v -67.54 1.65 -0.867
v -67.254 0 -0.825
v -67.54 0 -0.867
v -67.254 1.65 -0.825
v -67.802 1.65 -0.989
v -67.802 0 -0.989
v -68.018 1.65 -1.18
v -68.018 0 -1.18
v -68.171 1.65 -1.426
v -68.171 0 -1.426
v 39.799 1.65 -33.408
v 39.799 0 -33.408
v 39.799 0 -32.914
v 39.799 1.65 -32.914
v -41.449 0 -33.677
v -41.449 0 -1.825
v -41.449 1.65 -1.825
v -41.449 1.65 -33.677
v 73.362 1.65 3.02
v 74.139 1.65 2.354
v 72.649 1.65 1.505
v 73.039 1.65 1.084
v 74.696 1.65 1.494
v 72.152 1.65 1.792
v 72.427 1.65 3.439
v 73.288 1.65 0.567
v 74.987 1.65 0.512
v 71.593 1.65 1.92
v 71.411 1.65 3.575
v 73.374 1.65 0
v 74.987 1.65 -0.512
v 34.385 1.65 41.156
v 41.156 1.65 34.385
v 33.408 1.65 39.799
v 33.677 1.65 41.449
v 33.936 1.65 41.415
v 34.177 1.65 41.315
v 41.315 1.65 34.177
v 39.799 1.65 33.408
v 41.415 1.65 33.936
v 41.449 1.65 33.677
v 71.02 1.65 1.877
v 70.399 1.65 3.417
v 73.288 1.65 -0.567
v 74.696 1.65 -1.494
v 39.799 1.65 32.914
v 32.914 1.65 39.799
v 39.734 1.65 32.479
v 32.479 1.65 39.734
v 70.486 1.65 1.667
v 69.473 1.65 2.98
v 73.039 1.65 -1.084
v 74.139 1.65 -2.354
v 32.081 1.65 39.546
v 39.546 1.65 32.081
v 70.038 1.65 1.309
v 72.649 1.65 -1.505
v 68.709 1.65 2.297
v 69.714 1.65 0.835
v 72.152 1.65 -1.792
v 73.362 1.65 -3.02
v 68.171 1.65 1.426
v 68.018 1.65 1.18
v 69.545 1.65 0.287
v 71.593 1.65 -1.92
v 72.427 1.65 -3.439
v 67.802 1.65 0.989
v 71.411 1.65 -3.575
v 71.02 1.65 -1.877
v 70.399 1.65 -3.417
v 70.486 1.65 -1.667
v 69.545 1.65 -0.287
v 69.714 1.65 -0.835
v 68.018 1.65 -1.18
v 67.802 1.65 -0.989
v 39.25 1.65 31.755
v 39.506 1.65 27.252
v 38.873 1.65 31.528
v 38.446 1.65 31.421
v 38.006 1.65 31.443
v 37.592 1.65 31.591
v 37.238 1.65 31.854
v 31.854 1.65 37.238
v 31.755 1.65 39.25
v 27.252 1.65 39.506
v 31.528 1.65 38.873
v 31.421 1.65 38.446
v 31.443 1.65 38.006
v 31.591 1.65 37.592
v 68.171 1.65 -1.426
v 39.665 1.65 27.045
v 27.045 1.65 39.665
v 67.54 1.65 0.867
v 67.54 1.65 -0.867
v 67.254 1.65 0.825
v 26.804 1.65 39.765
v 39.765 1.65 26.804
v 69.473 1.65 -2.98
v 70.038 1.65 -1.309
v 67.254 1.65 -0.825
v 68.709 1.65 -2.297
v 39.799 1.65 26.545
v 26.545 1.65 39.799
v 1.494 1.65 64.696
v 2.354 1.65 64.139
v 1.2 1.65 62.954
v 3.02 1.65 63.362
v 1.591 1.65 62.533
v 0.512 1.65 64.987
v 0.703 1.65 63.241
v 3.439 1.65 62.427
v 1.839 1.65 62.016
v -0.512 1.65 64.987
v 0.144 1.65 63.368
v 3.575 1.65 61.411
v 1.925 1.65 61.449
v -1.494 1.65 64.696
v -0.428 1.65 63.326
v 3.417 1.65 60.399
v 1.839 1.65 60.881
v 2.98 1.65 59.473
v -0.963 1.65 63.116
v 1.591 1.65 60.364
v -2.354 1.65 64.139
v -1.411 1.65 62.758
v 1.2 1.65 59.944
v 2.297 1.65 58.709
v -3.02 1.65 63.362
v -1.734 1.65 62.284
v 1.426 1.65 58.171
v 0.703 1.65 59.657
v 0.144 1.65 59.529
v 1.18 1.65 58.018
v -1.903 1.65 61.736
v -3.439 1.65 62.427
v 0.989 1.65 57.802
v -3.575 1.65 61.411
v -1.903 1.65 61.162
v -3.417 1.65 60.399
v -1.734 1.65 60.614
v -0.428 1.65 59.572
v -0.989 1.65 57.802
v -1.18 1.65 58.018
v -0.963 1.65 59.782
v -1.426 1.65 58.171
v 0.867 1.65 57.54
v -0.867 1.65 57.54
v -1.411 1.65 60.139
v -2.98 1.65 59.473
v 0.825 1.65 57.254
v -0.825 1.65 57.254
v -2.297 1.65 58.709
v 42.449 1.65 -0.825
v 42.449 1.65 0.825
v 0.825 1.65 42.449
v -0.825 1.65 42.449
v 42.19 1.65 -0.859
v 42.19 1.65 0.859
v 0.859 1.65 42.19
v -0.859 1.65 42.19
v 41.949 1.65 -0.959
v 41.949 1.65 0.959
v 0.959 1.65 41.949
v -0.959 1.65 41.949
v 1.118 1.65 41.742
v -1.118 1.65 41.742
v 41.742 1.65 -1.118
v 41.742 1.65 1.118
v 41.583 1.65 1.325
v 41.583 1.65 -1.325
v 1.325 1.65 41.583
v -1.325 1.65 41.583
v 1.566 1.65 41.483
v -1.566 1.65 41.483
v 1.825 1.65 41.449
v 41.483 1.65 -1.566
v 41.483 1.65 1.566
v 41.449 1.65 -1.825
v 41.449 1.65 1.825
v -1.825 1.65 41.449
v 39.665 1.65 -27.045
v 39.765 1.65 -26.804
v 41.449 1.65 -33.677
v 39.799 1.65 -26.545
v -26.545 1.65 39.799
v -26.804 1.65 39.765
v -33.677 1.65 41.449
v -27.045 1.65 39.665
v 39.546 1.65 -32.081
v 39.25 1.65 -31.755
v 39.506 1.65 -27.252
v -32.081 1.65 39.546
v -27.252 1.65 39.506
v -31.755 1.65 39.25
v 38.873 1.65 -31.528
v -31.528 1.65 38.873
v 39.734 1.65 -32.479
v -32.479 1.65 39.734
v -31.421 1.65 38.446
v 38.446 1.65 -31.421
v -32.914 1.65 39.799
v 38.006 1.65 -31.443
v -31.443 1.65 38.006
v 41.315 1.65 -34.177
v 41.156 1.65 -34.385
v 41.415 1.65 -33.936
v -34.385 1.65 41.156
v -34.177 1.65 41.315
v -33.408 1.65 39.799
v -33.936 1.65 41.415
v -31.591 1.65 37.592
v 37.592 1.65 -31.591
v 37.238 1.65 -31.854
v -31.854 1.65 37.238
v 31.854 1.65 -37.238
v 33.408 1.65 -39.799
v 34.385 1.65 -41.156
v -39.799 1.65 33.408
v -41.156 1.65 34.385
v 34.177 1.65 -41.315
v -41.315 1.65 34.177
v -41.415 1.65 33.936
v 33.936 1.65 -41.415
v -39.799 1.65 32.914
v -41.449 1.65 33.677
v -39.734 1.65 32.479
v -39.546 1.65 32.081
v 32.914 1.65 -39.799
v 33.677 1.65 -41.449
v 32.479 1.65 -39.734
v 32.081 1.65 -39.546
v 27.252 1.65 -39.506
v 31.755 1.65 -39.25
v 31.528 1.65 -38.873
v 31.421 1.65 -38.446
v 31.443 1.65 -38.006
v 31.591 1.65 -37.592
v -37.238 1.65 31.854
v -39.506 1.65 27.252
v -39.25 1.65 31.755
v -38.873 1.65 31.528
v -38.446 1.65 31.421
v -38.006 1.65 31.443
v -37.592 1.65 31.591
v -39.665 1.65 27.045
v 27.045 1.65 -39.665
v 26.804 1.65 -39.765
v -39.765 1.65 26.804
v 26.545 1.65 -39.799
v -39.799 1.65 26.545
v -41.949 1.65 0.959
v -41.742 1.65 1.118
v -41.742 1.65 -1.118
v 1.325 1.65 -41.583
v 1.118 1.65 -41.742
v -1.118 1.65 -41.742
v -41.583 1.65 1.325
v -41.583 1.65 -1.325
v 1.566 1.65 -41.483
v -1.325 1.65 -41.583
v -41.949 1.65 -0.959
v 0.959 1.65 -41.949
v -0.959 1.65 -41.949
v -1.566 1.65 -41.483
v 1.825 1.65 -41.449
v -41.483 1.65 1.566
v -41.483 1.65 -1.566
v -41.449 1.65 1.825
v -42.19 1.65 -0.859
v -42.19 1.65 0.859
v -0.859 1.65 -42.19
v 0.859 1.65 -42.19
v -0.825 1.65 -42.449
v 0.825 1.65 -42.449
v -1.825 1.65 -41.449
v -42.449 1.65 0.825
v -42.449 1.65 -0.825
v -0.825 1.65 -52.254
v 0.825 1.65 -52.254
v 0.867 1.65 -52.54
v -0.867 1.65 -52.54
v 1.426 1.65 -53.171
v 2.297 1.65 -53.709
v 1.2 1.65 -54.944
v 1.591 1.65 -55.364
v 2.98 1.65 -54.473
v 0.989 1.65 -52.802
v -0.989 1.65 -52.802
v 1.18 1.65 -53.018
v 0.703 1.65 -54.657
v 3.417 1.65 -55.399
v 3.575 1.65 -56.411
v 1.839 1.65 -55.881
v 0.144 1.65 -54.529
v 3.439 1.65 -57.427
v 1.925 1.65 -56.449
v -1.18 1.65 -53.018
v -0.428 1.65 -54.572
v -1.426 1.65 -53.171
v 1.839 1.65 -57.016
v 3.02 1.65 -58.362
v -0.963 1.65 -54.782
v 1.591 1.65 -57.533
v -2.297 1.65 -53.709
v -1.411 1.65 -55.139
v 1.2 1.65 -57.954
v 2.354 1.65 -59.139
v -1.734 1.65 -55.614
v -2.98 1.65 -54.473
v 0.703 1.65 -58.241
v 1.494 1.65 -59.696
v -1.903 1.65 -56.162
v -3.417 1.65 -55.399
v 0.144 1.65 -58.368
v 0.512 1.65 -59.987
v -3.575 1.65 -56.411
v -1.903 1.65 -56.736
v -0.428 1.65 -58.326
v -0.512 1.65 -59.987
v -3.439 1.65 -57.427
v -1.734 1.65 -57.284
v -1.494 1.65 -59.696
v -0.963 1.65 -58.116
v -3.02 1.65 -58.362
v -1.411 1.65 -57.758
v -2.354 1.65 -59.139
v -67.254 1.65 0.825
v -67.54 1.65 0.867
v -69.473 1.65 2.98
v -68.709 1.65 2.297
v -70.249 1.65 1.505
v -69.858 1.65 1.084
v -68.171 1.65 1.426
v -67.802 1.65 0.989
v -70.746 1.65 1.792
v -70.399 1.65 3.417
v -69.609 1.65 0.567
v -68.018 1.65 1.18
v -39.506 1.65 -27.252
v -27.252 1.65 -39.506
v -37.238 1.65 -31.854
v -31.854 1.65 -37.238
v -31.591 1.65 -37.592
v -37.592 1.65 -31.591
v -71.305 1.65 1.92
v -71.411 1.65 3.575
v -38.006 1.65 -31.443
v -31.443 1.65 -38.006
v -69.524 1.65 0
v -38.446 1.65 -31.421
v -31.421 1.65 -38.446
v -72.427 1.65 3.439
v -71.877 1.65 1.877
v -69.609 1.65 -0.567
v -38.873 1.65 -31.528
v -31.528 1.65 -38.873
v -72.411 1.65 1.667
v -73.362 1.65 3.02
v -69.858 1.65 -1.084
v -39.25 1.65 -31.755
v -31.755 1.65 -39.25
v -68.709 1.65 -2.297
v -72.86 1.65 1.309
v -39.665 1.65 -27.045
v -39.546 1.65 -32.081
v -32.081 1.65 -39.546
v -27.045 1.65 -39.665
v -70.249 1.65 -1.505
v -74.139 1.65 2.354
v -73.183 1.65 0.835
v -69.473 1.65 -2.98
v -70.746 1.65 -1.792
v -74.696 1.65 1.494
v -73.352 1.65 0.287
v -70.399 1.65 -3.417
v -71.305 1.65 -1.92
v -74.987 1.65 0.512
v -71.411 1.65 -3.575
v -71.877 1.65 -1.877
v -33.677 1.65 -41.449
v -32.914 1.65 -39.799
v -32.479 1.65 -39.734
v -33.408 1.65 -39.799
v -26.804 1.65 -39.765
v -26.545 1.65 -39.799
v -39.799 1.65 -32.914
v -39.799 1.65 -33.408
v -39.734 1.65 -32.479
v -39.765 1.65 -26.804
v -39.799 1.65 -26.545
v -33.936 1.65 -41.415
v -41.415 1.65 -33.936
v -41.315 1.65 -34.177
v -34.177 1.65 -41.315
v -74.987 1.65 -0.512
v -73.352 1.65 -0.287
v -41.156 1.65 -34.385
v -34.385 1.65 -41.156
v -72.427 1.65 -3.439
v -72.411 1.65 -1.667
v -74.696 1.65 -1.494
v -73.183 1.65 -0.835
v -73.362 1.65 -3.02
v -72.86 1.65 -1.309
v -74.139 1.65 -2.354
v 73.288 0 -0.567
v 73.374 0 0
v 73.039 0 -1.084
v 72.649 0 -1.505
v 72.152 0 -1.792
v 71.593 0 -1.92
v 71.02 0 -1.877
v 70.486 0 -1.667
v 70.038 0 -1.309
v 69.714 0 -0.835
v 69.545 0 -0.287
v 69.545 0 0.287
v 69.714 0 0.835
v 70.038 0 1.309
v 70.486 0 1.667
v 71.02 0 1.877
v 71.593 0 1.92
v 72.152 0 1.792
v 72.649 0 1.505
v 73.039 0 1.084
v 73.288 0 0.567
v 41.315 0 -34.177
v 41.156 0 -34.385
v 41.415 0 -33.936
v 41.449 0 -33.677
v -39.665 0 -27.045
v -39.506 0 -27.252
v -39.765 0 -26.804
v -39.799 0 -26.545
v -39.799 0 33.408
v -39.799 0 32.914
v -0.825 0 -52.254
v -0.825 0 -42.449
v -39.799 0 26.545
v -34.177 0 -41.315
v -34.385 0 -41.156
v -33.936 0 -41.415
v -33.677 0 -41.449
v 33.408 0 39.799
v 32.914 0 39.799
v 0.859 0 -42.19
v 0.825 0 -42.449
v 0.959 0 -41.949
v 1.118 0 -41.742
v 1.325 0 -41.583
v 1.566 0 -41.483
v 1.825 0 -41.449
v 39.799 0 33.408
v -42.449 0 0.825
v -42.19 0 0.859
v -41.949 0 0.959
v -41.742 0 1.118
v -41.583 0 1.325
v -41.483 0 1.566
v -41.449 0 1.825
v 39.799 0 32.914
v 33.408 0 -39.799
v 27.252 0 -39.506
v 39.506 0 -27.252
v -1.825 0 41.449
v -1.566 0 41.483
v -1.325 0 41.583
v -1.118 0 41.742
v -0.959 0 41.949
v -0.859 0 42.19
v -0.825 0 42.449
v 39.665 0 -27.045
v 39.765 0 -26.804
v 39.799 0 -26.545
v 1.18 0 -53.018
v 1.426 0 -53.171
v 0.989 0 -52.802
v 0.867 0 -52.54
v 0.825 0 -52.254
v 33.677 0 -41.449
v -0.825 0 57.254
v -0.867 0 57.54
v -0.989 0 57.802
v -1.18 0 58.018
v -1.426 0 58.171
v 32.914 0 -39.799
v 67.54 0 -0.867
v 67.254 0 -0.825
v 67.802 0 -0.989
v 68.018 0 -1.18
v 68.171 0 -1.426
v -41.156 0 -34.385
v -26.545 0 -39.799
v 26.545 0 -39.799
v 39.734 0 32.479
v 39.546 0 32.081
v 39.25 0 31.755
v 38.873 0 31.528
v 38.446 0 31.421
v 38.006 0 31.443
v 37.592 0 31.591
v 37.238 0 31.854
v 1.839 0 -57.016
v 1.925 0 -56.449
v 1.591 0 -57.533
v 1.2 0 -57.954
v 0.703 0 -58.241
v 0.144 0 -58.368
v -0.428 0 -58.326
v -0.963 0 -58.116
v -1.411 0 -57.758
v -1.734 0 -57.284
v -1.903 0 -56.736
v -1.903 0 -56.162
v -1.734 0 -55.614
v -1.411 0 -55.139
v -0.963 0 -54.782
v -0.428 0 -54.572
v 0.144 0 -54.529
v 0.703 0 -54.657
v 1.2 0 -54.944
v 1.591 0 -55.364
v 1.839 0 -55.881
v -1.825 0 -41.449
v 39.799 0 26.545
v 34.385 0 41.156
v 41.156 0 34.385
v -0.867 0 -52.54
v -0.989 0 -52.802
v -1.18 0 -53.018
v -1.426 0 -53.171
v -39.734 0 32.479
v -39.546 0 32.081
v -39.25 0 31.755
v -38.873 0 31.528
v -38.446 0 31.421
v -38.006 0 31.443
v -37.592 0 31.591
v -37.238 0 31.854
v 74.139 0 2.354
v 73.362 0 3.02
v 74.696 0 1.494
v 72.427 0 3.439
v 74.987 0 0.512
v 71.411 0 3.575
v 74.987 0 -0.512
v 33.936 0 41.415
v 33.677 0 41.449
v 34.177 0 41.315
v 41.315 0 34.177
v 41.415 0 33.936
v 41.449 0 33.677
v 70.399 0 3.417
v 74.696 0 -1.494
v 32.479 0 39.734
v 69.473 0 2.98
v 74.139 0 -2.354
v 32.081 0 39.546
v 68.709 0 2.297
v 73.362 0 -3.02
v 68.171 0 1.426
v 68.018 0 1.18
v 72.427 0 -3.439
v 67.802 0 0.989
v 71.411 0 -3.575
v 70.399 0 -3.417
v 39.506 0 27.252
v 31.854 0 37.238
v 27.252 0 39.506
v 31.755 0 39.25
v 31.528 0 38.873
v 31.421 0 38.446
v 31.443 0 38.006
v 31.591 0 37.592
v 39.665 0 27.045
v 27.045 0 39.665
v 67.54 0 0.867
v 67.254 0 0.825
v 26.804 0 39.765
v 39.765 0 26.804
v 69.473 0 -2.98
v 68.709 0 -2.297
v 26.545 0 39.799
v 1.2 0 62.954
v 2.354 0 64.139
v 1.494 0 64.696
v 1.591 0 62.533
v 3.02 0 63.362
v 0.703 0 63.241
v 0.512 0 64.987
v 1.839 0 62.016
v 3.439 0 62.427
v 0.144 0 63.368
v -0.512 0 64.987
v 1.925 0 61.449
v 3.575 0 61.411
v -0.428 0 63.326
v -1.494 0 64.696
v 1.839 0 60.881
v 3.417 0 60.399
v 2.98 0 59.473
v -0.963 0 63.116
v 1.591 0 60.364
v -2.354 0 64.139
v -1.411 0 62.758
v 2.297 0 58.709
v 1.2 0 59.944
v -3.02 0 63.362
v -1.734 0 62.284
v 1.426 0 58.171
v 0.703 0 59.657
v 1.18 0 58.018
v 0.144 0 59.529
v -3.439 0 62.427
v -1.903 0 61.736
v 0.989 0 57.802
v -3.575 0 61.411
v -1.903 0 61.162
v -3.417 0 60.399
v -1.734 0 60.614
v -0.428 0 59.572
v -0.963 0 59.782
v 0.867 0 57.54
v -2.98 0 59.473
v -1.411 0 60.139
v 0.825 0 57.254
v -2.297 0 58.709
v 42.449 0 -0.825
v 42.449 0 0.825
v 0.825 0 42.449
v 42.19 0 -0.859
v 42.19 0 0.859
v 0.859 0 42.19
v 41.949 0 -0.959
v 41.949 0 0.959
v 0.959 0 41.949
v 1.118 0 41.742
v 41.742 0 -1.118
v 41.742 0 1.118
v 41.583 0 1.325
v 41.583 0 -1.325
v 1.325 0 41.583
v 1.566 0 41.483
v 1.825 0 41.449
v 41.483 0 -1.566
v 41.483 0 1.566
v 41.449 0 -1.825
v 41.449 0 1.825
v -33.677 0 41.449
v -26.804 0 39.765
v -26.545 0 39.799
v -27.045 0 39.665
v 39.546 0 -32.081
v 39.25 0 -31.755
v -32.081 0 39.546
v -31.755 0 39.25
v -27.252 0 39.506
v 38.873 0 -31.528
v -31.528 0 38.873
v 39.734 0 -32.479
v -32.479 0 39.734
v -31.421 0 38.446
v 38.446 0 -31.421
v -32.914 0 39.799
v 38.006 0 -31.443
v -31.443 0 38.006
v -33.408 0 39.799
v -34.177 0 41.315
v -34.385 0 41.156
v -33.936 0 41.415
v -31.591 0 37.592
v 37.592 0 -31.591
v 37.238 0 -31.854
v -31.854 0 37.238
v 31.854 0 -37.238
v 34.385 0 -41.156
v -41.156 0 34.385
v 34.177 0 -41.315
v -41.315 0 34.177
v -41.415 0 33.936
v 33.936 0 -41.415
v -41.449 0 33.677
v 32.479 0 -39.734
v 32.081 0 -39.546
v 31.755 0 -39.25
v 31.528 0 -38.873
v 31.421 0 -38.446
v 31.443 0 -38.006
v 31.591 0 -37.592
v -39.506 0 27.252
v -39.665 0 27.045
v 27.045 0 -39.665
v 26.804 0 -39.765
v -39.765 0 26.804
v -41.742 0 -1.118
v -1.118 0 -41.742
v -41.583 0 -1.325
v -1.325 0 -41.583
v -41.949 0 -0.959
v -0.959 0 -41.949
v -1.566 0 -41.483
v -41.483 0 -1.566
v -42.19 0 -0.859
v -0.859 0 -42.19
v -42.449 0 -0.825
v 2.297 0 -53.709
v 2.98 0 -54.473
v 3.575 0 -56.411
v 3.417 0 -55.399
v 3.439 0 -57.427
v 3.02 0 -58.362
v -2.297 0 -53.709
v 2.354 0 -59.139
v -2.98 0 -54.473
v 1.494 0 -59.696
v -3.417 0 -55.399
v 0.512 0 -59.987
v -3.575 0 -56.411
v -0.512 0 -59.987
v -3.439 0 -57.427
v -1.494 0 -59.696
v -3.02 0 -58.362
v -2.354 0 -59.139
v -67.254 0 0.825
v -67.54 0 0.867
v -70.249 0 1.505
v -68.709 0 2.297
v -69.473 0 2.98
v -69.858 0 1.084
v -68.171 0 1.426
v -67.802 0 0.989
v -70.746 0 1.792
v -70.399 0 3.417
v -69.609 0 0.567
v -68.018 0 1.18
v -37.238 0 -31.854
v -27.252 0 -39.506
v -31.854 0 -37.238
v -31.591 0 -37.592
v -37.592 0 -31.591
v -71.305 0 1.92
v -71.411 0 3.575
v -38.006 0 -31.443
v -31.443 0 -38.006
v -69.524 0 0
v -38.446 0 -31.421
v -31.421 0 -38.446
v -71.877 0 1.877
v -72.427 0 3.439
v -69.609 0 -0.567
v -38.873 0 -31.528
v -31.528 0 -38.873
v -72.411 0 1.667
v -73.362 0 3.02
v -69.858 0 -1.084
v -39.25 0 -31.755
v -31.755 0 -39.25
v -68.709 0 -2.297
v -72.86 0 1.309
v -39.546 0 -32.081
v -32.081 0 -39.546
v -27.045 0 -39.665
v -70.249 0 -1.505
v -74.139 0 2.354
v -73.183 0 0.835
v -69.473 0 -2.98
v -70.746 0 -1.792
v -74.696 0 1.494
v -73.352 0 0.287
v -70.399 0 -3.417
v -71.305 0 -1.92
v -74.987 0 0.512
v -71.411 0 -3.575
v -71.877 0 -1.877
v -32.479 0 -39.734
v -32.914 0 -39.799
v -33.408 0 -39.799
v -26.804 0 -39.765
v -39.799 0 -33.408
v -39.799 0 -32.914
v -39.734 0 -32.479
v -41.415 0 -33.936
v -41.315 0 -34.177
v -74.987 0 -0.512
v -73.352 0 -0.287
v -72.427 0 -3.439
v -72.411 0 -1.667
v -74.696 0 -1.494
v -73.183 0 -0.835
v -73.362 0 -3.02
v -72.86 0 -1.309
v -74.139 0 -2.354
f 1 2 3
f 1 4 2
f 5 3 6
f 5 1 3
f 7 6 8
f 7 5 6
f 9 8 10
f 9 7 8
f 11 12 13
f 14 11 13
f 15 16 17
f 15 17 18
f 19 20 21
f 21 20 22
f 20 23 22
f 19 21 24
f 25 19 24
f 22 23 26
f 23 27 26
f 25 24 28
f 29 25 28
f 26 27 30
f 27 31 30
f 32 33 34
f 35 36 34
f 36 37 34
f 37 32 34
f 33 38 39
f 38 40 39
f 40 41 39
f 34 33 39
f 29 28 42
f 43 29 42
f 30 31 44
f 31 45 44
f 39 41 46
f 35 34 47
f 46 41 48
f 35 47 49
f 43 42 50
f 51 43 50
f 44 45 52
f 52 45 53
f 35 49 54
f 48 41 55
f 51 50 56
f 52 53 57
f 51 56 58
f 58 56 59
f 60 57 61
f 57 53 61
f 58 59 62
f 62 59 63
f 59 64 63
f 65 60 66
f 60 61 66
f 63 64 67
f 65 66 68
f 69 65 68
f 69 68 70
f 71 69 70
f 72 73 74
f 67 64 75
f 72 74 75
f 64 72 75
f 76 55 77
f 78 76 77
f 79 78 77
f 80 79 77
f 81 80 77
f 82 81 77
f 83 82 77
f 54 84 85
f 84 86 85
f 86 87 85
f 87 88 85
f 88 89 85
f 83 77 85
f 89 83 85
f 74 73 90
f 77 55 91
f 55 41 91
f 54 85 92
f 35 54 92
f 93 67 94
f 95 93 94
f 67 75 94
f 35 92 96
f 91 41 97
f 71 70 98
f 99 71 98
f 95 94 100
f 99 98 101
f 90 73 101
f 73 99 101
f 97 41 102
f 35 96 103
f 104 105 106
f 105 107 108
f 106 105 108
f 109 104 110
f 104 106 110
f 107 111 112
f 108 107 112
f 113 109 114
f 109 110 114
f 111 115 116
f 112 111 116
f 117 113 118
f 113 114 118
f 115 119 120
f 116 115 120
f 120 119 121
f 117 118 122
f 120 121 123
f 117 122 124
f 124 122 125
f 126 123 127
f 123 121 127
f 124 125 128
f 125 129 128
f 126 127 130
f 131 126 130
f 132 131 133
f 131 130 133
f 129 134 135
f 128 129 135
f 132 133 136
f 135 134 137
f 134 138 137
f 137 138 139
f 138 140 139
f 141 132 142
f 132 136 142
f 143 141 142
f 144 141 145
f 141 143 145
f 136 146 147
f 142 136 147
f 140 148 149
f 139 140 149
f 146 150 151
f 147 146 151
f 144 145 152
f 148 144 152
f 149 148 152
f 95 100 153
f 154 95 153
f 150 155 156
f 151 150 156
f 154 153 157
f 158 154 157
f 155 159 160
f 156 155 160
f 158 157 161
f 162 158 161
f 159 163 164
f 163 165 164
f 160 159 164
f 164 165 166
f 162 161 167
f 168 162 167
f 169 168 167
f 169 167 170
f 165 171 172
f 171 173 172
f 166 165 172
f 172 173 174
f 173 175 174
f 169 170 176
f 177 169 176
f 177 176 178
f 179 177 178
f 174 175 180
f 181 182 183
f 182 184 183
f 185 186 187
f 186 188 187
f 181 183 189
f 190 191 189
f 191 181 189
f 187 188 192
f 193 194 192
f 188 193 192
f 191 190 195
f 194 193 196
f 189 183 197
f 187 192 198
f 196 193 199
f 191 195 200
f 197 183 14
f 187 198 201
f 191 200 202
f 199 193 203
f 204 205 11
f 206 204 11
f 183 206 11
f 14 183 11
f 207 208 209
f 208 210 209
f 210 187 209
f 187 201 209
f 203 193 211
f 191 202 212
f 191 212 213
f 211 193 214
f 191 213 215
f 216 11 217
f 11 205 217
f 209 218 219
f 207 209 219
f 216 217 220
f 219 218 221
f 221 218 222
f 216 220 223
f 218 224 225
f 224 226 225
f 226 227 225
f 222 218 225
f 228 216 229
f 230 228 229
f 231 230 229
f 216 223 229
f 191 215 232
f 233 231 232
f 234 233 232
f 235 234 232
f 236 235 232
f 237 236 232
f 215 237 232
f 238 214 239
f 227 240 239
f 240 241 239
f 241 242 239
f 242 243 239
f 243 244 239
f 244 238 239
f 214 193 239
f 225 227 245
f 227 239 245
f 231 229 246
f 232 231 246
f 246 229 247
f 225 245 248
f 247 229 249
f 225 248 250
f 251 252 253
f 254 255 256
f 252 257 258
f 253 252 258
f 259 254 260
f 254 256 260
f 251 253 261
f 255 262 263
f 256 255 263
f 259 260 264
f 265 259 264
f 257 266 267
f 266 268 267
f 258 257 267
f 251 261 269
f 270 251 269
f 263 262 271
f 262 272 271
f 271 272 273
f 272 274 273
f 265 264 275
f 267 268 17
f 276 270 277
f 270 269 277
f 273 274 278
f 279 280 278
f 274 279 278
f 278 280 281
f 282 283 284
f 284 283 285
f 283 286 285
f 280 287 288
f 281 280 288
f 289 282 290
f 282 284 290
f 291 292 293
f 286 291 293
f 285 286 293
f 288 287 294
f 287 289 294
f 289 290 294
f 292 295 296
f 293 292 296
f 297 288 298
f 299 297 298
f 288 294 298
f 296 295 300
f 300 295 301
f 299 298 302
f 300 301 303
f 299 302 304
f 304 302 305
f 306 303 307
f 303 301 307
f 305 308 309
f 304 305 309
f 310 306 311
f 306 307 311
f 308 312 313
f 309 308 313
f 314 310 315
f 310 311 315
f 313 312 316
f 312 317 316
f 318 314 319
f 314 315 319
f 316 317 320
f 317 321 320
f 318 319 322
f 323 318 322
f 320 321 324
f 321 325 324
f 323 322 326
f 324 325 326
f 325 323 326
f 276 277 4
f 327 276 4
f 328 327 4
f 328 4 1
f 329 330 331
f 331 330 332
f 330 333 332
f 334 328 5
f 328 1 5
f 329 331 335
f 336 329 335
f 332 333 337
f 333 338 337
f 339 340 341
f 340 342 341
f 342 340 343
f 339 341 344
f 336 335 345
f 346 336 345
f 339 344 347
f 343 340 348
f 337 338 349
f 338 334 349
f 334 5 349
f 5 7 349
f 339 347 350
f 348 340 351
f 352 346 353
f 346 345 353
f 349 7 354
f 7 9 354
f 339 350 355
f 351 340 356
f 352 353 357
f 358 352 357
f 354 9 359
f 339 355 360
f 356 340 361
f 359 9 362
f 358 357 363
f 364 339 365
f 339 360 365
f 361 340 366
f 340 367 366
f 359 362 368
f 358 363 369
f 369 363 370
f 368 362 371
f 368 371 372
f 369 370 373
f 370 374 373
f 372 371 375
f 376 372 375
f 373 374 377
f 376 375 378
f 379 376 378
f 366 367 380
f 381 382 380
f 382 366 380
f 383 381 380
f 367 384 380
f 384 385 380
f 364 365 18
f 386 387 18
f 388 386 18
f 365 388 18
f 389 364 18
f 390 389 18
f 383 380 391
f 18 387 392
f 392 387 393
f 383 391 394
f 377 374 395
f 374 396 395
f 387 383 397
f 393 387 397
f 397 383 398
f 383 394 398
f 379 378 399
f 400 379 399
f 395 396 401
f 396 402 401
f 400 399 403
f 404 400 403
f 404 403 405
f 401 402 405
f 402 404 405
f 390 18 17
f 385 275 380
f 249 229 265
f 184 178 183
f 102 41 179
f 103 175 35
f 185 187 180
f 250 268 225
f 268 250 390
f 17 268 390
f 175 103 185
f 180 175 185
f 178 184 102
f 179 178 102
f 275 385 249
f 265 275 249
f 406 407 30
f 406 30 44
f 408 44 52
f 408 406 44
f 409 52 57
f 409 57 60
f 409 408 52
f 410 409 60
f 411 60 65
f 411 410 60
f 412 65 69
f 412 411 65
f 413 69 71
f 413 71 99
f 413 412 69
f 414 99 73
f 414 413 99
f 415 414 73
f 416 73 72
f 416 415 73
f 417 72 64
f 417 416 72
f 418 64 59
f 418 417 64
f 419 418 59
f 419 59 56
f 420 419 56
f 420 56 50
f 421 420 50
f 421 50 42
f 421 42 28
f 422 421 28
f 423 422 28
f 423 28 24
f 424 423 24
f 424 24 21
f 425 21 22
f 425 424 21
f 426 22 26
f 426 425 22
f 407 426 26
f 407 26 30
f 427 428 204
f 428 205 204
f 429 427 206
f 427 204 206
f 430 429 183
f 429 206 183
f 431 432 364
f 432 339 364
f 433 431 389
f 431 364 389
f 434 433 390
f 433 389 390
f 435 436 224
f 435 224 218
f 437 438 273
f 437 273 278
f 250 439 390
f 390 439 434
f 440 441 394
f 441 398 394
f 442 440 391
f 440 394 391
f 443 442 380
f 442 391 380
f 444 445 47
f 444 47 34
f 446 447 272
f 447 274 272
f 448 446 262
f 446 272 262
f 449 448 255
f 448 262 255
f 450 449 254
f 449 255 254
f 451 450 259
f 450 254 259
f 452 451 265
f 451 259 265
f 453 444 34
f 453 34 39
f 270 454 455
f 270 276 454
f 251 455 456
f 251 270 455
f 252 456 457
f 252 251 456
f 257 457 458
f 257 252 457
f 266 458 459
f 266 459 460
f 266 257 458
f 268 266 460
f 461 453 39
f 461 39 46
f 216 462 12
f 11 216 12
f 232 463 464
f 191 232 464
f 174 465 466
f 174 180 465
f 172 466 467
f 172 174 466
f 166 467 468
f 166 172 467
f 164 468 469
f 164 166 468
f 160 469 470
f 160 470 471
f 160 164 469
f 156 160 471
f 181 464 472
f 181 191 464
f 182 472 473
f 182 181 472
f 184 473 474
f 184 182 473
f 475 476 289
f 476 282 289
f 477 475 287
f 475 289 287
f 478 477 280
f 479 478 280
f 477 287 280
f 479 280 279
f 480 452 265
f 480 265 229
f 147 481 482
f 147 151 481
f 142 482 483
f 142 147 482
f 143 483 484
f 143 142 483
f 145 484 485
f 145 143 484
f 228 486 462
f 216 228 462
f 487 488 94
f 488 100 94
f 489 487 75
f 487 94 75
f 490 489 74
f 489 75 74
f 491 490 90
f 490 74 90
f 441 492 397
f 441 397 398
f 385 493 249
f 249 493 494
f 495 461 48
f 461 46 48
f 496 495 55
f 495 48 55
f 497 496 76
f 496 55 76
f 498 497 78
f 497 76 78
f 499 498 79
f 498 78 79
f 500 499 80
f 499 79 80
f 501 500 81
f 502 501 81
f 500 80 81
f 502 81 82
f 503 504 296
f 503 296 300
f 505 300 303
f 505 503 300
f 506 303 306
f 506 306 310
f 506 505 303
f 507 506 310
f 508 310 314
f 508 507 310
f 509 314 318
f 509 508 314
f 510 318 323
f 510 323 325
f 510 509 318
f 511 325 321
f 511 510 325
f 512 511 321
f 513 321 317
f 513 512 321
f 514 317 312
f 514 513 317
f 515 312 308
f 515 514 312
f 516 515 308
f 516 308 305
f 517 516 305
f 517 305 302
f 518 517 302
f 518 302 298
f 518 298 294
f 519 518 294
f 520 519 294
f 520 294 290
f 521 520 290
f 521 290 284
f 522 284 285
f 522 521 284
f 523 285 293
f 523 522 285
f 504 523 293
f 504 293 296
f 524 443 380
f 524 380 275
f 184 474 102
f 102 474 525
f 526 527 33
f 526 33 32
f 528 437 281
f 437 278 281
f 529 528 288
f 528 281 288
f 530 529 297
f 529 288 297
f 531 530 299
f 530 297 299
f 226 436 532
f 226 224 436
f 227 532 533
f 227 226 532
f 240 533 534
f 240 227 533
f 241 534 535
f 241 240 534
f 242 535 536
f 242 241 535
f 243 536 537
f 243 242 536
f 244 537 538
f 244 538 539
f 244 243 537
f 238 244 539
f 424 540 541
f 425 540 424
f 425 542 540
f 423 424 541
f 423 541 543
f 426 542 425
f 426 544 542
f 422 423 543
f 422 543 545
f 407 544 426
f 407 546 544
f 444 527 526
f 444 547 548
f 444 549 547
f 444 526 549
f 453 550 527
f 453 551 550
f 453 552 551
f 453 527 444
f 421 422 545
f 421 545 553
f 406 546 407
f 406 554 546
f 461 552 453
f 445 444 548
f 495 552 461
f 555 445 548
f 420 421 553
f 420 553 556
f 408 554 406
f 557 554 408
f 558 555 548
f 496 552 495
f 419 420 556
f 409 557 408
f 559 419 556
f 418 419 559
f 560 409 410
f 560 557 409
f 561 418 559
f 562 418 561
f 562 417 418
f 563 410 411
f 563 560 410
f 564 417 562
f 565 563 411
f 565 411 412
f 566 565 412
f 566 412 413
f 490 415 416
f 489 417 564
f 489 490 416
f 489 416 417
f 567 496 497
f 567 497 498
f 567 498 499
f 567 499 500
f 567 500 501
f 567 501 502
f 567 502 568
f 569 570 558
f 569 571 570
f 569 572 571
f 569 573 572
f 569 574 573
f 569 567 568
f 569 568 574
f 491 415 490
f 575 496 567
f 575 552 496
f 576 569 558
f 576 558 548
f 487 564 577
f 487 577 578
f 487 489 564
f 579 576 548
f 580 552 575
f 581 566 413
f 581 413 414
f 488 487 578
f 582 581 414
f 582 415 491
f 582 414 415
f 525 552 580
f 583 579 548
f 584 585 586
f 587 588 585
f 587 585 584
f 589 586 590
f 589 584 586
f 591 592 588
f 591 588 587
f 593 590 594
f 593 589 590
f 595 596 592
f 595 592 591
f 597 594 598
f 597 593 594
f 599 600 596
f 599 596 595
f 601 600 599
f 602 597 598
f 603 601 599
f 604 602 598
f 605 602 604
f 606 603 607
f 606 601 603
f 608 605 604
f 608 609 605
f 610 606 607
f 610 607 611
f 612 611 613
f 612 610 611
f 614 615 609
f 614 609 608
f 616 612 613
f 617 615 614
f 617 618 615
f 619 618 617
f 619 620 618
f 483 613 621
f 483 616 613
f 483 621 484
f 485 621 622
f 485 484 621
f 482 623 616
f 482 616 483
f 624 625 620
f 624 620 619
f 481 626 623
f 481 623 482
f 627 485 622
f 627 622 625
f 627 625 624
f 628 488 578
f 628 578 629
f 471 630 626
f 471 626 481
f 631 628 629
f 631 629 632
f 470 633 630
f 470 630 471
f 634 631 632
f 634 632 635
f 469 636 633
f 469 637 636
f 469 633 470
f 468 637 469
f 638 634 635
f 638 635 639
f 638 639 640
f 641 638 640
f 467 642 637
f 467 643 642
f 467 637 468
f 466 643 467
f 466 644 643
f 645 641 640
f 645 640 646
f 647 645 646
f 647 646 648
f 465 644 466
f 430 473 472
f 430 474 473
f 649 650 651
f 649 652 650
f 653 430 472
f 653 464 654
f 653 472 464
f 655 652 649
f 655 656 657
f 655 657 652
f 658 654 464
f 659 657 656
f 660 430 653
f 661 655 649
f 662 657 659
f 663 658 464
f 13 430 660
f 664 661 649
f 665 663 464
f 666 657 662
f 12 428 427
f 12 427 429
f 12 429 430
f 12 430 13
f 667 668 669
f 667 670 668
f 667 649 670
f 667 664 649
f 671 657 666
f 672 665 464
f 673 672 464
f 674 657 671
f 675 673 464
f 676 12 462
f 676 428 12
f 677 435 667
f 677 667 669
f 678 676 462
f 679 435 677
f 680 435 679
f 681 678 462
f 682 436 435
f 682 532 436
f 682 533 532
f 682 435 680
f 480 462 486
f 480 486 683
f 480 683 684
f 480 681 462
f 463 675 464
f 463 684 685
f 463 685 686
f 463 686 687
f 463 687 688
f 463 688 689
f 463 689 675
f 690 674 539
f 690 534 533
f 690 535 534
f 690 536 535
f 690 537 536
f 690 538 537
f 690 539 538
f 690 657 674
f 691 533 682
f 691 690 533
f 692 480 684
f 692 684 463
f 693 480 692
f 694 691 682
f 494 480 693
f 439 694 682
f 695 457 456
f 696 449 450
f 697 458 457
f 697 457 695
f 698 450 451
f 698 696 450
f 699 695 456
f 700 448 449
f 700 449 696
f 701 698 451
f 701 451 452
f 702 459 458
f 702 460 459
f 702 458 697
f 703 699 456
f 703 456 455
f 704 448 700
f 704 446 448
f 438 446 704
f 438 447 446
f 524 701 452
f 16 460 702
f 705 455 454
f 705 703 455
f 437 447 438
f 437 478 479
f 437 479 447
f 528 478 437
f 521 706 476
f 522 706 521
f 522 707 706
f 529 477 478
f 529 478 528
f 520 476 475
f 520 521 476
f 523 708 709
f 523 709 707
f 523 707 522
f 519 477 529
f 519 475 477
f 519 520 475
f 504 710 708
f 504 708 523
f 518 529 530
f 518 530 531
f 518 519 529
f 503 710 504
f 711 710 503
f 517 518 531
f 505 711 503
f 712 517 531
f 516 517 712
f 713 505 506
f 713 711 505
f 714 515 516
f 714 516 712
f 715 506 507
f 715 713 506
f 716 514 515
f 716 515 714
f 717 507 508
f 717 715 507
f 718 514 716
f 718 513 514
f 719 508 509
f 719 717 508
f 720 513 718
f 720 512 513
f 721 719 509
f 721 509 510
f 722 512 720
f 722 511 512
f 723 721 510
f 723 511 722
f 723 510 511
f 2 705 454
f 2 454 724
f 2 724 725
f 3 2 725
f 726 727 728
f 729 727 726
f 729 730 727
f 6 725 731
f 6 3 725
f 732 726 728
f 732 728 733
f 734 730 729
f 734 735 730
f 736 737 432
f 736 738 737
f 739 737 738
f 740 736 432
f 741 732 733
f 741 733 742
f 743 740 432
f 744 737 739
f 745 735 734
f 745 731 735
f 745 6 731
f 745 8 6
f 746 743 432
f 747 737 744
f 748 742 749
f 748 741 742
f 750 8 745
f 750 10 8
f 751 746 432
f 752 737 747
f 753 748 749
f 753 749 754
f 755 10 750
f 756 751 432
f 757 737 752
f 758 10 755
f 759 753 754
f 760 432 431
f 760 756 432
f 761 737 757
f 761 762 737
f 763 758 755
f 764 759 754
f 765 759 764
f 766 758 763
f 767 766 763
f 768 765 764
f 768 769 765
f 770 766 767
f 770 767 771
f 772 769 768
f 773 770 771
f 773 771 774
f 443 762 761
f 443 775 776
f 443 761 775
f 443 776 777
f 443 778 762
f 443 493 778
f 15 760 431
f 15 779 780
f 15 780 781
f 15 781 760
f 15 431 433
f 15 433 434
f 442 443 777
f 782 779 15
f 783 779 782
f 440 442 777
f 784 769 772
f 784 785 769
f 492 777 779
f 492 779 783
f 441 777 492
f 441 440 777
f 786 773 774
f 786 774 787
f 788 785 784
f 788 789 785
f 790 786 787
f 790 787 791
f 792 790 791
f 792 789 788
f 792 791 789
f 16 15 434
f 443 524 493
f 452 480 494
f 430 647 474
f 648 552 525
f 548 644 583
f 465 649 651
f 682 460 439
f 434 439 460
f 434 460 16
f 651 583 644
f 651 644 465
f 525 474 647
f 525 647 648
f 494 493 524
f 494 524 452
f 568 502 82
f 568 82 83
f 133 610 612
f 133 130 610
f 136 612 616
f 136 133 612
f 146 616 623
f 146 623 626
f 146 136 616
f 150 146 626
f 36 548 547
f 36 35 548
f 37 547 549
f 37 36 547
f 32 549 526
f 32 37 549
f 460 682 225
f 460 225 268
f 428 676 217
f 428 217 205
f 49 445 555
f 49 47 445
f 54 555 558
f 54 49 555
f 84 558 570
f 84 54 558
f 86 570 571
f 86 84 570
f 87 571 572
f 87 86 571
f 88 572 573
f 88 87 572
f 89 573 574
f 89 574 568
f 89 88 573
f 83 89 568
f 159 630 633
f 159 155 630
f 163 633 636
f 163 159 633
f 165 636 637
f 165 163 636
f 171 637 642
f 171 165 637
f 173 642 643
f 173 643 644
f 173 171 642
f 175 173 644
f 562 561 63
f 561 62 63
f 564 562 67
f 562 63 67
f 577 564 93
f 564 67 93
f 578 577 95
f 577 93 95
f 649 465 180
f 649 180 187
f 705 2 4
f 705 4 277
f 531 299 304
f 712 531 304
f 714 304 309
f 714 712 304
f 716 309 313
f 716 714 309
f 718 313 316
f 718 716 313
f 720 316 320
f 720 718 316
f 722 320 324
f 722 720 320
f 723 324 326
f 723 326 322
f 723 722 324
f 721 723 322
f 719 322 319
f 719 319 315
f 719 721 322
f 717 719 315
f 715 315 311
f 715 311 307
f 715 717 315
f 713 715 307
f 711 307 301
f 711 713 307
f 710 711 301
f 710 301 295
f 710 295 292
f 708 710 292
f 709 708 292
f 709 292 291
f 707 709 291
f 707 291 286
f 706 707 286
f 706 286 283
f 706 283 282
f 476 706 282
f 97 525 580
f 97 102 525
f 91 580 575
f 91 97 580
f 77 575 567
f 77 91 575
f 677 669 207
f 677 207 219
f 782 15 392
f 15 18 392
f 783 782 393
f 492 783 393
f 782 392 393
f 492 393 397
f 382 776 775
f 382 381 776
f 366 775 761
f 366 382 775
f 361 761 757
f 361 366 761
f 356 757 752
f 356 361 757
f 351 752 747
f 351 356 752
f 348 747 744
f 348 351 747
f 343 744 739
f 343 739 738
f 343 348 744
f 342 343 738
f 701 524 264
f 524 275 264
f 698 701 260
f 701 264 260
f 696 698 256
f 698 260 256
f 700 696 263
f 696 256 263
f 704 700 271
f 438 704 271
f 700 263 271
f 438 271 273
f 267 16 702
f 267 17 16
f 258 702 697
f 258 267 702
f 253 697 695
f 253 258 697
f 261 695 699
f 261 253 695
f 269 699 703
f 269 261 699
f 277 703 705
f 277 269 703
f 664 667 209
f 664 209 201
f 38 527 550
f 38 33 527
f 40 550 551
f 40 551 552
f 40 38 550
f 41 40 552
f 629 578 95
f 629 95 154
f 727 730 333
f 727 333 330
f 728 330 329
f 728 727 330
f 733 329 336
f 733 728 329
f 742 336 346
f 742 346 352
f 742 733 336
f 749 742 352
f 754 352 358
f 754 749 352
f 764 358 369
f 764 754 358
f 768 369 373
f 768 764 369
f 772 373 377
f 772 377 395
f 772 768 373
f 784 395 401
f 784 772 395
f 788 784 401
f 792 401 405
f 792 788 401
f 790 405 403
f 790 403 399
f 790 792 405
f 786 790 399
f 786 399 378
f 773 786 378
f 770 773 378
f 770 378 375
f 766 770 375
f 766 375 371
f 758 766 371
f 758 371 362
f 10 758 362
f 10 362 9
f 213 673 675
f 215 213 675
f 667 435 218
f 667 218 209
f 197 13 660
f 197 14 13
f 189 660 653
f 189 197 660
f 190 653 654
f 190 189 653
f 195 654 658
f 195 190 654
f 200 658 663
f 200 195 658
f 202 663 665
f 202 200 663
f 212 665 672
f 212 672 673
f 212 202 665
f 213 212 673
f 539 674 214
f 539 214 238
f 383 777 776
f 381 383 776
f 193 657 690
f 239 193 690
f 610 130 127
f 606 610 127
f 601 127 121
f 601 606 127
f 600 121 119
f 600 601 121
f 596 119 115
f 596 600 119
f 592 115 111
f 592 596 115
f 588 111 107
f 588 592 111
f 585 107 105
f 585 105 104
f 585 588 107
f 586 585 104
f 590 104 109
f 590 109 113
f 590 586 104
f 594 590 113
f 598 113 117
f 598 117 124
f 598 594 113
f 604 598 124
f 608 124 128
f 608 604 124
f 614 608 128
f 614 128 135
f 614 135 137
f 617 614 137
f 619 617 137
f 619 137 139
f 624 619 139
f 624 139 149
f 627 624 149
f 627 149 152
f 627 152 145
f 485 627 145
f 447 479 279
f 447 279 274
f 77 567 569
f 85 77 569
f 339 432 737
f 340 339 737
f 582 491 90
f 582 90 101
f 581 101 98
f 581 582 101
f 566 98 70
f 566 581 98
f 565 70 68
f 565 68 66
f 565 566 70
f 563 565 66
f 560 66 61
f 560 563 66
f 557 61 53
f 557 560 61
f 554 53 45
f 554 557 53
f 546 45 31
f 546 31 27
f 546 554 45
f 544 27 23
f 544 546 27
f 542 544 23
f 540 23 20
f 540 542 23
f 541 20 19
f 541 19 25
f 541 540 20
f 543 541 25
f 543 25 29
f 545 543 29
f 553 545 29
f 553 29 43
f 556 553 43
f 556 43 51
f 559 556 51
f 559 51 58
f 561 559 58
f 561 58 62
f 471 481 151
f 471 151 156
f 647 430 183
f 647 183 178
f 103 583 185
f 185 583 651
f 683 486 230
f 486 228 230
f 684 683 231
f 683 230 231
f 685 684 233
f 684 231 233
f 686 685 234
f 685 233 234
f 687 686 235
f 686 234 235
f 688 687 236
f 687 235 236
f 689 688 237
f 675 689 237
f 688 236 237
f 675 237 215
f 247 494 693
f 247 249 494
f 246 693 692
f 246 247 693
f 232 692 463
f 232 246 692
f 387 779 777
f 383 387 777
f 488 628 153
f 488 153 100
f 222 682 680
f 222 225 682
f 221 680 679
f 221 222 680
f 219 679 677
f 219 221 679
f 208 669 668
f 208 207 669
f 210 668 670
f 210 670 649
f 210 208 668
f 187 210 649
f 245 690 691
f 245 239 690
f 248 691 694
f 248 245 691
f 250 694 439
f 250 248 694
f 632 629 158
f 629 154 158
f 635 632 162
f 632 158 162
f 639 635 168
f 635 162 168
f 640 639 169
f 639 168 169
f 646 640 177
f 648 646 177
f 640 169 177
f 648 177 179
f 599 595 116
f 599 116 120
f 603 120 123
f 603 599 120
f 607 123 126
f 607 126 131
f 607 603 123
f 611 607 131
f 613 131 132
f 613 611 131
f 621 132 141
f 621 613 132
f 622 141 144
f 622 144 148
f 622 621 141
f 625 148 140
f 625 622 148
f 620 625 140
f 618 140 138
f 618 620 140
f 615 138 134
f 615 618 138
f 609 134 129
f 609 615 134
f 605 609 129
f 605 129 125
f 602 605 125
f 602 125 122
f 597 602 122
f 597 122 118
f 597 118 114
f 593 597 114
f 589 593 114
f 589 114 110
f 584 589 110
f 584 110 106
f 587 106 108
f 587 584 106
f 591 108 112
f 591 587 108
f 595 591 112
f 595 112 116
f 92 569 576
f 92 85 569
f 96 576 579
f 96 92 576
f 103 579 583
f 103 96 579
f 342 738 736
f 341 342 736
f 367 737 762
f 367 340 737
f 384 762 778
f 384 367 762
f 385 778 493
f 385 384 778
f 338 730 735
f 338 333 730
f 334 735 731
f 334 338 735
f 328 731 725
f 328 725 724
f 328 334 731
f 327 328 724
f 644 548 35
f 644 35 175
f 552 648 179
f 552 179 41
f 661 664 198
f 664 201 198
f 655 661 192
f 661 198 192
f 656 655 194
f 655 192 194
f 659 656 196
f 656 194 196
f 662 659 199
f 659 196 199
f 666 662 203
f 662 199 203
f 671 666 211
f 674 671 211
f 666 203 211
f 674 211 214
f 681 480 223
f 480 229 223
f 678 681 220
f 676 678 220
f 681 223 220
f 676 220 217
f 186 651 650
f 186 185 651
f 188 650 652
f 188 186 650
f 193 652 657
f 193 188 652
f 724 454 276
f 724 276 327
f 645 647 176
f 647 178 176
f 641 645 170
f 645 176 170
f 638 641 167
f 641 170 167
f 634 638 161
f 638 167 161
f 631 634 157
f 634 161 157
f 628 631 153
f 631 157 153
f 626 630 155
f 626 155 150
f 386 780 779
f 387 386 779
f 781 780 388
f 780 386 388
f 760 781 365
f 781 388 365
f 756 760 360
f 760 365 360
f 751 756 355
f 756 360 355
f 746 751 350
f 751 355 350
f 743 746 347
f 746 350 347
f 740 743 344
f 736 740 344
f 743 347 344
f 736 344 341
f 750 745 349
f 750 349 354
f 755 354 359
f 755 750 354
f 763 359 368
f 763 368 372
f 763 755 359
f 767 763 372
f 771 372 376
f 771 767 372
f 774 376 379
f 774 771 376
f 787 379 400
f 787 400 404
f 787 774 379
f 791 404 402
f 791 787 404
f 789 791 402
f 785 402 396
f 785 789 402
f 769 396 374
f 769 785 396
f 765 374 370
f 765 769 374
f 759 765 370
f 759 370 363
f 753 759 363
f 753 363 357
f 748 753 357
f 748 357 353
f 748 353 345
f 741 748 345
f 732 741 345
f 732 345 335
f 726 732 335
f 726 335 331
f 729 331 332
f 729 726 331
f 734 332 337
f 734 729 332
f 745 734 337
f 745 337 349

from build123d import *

# Parameters (mm, degrees)
SKETCH1_R           = 1.925
BOSS_EXTRUDE1_DEPTH = 1.65
FILLET4_R           = 1
FILLET3_R           = 1.5
FILLET5_R           = 1


with BuildPart() as part:
    # Sketch1 → Boss-Extrude1 (new body)
    with BuildSketch(Plane(origin=(0, 0, 0), x_dir=(1, 0, 0), z_dir=(0, 1, 0))):
        with BuildLine():
            Line((-41.448800006, 34.091704203), (-34.091704203, 41.448800006))
            Line((-34.091704203, 41.448800006), (-0.825, 41.448800006))
            Line((-0.825, 41.448800006), (-0.825, 52.97029458))
            ThreePointArc((-0.825, 52.97029458), (0, 60.023800006), (0.825, 52.97029458))
            Line((0.825, 52.97029458), (0.825, 41.448800006))
            Line((0.825, 41.448800006), (34.091704203, 41.448800006))
            Line((34.091704203, 41.448800006), (41.448800006, 34.091704203))
            Line((41.448800006, 34.091704203), (41.448800006, 0.825))
            Line((41.448800006, 0.825), (67.97029458, 0.825))
            ThreePointArc((67.97029458, 0.825), (75.023800006, 0), (67.97029458, -0.825))
            Line((67.97029458, -0.825), (41.448800006, -0.825))
            Line((41.448800006, -0.825), (41.448800006, -34.091704203))
            Line((41.448800006, -34.091704203), (34.091704203, -41.448800006))
            Line((34.091704203, -41.448800006), (0.825, -41.448800006))
            Line((0.825, -41.448800006), (0.825, -57.97029458))
            ThreePointArc((0.825, -57.97029458), (0, -65.023800006), (-0.825, -57.97029458))
            Line((-0.825, -57.97029458), (-0.825, -41.448800006))
            Line((-0.825, -41.448800006), (-34.091704203, -41.448800006))
            Line((-34.091704203, -41.448800006), (-41.448800006, -34.091704203))
            Line((-41.448800006, -34.091704203), (-41.448800006, -0.825))
            Line((-41.448800006, -0.825), (-67.97029458, -0.825))
            ThreePointArc((-67.97029458, -0.825), (-75.023800006, 0), (-67.97029458, 0.825))
            Line((-67.97029458, 0.825), (-41.448800006, 0.825))
            Line((-41.448800006, 0.825), (-41.448800006, 34.091704203))
        make_face()
        with Locations((0, 56.448800006)):
            Circle(SKETCH1_R, mode=Mode.SUBTRACT)
        with Locations((71.448800006, 0)):
            Circle(SKETCH1_R, mode=Mode.SUBTRACT)
        with Locations((0, -61.448800006)):
            Circle(SKETCH1_R, mode=Mode.SUBTRACT)
        with Locations((-71.448800006, 0)):
            Circle(SKETCH1_R, mode=Mode.SUBTRACT)
        Polygon((-39.798800006, 33.408251825), (-33.408251825, 39.798800006), (-29.292890359, 39.798800006), (-39.798800006, 29.292890359), align=None, mode=Mode.SUBTRACT)
        Polygon((-33.408251825, -39.798800006), (-29.292890359, -39.798800006), (-39.798800006, -29.292890359), (-39.798800006, -33.408251825), align=None, mode=Mode.SUBTRACT)
        Polygon((39.798800006, -33.408251825), (39.798800006, -29.292890359), (29.292890359, -39.798800006), (33.408251825, -39.798800006), align=None, mode=Mode.SUBTRACT)
        Polygon((33.408251825, 39.798800006), (39.798800006, 33.408251825), (39.798800006, 29.292890359), (29.292890359, 39.798800006), align=None, mode=Mode.SUBTRACT)
        Polygon((-39.798800006, 26.959437981), (-26.959437981, 39.798800006), (26.959437981, 39.798800006), (39.798800006, 26.959437981), (39.798800006, -26.959437981), (26.959437981, -39.798800006), (-26.959437981, -39.798800006), (-39.798800006, -26.959437981), align=None, mode=Mode.SUBTRACT)
    extrude(amount=BOSS_EXTRUDE1_DEPTH)

    # Fillet4
    fillet4_edges = [part.edges().sort_by_distance(p)[0] for p in [
        (-0.825, 0.825, -41.448800006),
        (-0.825, 0.825, -52.97029458),
        (0.825, 0.825, -52.97029458),
        (0.825, 0.825, -41.448800006),
        (41.448800006, 0.825, -0.825),
        (67.97029458, 0.825, -0.825),
        (67.97029458, 0.825, 0.825),
        (41.448800006, 0.825, 0.825),
        (0.825, 0.825, 41.448800006),
        (0.825, 0.825, 57.97029458),
        (-0.825, 0.825, 57.97029458),
        (-0.825, 0.825, 41.448800006),
        (-41.448800006, 0.825, 0.825),
        (-67.97029458, 0.825, 0.825),
        (-67.97029458, 0.825, -0.825),
        (-41.448800006, 0.825, -0.825),
    ]]
    fillet(fillet4_edges, radius=FILLET4_R)

    # Fillet3
    fillet3_edges = [part.edges().sort_by_distance(p)[0] for p in [
        (-29.292890359, 0.825, 39.798800006),
        (-39.798800006, 0.825, 29.292890359),
        (-39.798800006, 0.825, -29.292890359),
        (-29.292890359, 0.825, -39.798800006),
        (29.292890359, 0.825, -39.798800006),
        (39.798800006, 0.825, -29.292890359),
        (39.798800006, 0.825, 29.292890359),
        (29.292890359, 0.825, 39.798800006),
    ]]
    fillet(fillet3_edges, radius=FILLET3_R)

    # Fillet5
    fillet5_edges = [part.edges().sort_by_distance(p)[0] for p in [
        (-39.798800006, 0.825, -26.959437981),
        (-39.798800006, 0.825, 26.959437981),
        (-26.959437981, 0.825, 39.798800006),
        (26.959437981, 0.825, 39.798800006),
        (39.798800006, 0.825, 26.959437981),
        (39.798800006, 0.825, -26.959437981),
        (26.959437981, 0.825, -39.798800006),
        (-26.959437981, 0.825, -39.798800006),
        (-41.448800006, 0.825, -34.091704203),
        (-34.091704203, 0.825, -41.448800006),
        (34.091704203, 0.825, -41.448800006),
        (41.448800006, 0.825, -34.091704203),
        (41.448800006, 0.825, 34.091704203),
        (34.091704203, 0.825, 41.448800006),
        (-34.091704203, 0.825, 41.448800006),
        (-41.448800006, 0.825, 34.091704203),
    ]]
    fillet(fillet5_edges, radius=FILLET5_R)


solid = part.part
